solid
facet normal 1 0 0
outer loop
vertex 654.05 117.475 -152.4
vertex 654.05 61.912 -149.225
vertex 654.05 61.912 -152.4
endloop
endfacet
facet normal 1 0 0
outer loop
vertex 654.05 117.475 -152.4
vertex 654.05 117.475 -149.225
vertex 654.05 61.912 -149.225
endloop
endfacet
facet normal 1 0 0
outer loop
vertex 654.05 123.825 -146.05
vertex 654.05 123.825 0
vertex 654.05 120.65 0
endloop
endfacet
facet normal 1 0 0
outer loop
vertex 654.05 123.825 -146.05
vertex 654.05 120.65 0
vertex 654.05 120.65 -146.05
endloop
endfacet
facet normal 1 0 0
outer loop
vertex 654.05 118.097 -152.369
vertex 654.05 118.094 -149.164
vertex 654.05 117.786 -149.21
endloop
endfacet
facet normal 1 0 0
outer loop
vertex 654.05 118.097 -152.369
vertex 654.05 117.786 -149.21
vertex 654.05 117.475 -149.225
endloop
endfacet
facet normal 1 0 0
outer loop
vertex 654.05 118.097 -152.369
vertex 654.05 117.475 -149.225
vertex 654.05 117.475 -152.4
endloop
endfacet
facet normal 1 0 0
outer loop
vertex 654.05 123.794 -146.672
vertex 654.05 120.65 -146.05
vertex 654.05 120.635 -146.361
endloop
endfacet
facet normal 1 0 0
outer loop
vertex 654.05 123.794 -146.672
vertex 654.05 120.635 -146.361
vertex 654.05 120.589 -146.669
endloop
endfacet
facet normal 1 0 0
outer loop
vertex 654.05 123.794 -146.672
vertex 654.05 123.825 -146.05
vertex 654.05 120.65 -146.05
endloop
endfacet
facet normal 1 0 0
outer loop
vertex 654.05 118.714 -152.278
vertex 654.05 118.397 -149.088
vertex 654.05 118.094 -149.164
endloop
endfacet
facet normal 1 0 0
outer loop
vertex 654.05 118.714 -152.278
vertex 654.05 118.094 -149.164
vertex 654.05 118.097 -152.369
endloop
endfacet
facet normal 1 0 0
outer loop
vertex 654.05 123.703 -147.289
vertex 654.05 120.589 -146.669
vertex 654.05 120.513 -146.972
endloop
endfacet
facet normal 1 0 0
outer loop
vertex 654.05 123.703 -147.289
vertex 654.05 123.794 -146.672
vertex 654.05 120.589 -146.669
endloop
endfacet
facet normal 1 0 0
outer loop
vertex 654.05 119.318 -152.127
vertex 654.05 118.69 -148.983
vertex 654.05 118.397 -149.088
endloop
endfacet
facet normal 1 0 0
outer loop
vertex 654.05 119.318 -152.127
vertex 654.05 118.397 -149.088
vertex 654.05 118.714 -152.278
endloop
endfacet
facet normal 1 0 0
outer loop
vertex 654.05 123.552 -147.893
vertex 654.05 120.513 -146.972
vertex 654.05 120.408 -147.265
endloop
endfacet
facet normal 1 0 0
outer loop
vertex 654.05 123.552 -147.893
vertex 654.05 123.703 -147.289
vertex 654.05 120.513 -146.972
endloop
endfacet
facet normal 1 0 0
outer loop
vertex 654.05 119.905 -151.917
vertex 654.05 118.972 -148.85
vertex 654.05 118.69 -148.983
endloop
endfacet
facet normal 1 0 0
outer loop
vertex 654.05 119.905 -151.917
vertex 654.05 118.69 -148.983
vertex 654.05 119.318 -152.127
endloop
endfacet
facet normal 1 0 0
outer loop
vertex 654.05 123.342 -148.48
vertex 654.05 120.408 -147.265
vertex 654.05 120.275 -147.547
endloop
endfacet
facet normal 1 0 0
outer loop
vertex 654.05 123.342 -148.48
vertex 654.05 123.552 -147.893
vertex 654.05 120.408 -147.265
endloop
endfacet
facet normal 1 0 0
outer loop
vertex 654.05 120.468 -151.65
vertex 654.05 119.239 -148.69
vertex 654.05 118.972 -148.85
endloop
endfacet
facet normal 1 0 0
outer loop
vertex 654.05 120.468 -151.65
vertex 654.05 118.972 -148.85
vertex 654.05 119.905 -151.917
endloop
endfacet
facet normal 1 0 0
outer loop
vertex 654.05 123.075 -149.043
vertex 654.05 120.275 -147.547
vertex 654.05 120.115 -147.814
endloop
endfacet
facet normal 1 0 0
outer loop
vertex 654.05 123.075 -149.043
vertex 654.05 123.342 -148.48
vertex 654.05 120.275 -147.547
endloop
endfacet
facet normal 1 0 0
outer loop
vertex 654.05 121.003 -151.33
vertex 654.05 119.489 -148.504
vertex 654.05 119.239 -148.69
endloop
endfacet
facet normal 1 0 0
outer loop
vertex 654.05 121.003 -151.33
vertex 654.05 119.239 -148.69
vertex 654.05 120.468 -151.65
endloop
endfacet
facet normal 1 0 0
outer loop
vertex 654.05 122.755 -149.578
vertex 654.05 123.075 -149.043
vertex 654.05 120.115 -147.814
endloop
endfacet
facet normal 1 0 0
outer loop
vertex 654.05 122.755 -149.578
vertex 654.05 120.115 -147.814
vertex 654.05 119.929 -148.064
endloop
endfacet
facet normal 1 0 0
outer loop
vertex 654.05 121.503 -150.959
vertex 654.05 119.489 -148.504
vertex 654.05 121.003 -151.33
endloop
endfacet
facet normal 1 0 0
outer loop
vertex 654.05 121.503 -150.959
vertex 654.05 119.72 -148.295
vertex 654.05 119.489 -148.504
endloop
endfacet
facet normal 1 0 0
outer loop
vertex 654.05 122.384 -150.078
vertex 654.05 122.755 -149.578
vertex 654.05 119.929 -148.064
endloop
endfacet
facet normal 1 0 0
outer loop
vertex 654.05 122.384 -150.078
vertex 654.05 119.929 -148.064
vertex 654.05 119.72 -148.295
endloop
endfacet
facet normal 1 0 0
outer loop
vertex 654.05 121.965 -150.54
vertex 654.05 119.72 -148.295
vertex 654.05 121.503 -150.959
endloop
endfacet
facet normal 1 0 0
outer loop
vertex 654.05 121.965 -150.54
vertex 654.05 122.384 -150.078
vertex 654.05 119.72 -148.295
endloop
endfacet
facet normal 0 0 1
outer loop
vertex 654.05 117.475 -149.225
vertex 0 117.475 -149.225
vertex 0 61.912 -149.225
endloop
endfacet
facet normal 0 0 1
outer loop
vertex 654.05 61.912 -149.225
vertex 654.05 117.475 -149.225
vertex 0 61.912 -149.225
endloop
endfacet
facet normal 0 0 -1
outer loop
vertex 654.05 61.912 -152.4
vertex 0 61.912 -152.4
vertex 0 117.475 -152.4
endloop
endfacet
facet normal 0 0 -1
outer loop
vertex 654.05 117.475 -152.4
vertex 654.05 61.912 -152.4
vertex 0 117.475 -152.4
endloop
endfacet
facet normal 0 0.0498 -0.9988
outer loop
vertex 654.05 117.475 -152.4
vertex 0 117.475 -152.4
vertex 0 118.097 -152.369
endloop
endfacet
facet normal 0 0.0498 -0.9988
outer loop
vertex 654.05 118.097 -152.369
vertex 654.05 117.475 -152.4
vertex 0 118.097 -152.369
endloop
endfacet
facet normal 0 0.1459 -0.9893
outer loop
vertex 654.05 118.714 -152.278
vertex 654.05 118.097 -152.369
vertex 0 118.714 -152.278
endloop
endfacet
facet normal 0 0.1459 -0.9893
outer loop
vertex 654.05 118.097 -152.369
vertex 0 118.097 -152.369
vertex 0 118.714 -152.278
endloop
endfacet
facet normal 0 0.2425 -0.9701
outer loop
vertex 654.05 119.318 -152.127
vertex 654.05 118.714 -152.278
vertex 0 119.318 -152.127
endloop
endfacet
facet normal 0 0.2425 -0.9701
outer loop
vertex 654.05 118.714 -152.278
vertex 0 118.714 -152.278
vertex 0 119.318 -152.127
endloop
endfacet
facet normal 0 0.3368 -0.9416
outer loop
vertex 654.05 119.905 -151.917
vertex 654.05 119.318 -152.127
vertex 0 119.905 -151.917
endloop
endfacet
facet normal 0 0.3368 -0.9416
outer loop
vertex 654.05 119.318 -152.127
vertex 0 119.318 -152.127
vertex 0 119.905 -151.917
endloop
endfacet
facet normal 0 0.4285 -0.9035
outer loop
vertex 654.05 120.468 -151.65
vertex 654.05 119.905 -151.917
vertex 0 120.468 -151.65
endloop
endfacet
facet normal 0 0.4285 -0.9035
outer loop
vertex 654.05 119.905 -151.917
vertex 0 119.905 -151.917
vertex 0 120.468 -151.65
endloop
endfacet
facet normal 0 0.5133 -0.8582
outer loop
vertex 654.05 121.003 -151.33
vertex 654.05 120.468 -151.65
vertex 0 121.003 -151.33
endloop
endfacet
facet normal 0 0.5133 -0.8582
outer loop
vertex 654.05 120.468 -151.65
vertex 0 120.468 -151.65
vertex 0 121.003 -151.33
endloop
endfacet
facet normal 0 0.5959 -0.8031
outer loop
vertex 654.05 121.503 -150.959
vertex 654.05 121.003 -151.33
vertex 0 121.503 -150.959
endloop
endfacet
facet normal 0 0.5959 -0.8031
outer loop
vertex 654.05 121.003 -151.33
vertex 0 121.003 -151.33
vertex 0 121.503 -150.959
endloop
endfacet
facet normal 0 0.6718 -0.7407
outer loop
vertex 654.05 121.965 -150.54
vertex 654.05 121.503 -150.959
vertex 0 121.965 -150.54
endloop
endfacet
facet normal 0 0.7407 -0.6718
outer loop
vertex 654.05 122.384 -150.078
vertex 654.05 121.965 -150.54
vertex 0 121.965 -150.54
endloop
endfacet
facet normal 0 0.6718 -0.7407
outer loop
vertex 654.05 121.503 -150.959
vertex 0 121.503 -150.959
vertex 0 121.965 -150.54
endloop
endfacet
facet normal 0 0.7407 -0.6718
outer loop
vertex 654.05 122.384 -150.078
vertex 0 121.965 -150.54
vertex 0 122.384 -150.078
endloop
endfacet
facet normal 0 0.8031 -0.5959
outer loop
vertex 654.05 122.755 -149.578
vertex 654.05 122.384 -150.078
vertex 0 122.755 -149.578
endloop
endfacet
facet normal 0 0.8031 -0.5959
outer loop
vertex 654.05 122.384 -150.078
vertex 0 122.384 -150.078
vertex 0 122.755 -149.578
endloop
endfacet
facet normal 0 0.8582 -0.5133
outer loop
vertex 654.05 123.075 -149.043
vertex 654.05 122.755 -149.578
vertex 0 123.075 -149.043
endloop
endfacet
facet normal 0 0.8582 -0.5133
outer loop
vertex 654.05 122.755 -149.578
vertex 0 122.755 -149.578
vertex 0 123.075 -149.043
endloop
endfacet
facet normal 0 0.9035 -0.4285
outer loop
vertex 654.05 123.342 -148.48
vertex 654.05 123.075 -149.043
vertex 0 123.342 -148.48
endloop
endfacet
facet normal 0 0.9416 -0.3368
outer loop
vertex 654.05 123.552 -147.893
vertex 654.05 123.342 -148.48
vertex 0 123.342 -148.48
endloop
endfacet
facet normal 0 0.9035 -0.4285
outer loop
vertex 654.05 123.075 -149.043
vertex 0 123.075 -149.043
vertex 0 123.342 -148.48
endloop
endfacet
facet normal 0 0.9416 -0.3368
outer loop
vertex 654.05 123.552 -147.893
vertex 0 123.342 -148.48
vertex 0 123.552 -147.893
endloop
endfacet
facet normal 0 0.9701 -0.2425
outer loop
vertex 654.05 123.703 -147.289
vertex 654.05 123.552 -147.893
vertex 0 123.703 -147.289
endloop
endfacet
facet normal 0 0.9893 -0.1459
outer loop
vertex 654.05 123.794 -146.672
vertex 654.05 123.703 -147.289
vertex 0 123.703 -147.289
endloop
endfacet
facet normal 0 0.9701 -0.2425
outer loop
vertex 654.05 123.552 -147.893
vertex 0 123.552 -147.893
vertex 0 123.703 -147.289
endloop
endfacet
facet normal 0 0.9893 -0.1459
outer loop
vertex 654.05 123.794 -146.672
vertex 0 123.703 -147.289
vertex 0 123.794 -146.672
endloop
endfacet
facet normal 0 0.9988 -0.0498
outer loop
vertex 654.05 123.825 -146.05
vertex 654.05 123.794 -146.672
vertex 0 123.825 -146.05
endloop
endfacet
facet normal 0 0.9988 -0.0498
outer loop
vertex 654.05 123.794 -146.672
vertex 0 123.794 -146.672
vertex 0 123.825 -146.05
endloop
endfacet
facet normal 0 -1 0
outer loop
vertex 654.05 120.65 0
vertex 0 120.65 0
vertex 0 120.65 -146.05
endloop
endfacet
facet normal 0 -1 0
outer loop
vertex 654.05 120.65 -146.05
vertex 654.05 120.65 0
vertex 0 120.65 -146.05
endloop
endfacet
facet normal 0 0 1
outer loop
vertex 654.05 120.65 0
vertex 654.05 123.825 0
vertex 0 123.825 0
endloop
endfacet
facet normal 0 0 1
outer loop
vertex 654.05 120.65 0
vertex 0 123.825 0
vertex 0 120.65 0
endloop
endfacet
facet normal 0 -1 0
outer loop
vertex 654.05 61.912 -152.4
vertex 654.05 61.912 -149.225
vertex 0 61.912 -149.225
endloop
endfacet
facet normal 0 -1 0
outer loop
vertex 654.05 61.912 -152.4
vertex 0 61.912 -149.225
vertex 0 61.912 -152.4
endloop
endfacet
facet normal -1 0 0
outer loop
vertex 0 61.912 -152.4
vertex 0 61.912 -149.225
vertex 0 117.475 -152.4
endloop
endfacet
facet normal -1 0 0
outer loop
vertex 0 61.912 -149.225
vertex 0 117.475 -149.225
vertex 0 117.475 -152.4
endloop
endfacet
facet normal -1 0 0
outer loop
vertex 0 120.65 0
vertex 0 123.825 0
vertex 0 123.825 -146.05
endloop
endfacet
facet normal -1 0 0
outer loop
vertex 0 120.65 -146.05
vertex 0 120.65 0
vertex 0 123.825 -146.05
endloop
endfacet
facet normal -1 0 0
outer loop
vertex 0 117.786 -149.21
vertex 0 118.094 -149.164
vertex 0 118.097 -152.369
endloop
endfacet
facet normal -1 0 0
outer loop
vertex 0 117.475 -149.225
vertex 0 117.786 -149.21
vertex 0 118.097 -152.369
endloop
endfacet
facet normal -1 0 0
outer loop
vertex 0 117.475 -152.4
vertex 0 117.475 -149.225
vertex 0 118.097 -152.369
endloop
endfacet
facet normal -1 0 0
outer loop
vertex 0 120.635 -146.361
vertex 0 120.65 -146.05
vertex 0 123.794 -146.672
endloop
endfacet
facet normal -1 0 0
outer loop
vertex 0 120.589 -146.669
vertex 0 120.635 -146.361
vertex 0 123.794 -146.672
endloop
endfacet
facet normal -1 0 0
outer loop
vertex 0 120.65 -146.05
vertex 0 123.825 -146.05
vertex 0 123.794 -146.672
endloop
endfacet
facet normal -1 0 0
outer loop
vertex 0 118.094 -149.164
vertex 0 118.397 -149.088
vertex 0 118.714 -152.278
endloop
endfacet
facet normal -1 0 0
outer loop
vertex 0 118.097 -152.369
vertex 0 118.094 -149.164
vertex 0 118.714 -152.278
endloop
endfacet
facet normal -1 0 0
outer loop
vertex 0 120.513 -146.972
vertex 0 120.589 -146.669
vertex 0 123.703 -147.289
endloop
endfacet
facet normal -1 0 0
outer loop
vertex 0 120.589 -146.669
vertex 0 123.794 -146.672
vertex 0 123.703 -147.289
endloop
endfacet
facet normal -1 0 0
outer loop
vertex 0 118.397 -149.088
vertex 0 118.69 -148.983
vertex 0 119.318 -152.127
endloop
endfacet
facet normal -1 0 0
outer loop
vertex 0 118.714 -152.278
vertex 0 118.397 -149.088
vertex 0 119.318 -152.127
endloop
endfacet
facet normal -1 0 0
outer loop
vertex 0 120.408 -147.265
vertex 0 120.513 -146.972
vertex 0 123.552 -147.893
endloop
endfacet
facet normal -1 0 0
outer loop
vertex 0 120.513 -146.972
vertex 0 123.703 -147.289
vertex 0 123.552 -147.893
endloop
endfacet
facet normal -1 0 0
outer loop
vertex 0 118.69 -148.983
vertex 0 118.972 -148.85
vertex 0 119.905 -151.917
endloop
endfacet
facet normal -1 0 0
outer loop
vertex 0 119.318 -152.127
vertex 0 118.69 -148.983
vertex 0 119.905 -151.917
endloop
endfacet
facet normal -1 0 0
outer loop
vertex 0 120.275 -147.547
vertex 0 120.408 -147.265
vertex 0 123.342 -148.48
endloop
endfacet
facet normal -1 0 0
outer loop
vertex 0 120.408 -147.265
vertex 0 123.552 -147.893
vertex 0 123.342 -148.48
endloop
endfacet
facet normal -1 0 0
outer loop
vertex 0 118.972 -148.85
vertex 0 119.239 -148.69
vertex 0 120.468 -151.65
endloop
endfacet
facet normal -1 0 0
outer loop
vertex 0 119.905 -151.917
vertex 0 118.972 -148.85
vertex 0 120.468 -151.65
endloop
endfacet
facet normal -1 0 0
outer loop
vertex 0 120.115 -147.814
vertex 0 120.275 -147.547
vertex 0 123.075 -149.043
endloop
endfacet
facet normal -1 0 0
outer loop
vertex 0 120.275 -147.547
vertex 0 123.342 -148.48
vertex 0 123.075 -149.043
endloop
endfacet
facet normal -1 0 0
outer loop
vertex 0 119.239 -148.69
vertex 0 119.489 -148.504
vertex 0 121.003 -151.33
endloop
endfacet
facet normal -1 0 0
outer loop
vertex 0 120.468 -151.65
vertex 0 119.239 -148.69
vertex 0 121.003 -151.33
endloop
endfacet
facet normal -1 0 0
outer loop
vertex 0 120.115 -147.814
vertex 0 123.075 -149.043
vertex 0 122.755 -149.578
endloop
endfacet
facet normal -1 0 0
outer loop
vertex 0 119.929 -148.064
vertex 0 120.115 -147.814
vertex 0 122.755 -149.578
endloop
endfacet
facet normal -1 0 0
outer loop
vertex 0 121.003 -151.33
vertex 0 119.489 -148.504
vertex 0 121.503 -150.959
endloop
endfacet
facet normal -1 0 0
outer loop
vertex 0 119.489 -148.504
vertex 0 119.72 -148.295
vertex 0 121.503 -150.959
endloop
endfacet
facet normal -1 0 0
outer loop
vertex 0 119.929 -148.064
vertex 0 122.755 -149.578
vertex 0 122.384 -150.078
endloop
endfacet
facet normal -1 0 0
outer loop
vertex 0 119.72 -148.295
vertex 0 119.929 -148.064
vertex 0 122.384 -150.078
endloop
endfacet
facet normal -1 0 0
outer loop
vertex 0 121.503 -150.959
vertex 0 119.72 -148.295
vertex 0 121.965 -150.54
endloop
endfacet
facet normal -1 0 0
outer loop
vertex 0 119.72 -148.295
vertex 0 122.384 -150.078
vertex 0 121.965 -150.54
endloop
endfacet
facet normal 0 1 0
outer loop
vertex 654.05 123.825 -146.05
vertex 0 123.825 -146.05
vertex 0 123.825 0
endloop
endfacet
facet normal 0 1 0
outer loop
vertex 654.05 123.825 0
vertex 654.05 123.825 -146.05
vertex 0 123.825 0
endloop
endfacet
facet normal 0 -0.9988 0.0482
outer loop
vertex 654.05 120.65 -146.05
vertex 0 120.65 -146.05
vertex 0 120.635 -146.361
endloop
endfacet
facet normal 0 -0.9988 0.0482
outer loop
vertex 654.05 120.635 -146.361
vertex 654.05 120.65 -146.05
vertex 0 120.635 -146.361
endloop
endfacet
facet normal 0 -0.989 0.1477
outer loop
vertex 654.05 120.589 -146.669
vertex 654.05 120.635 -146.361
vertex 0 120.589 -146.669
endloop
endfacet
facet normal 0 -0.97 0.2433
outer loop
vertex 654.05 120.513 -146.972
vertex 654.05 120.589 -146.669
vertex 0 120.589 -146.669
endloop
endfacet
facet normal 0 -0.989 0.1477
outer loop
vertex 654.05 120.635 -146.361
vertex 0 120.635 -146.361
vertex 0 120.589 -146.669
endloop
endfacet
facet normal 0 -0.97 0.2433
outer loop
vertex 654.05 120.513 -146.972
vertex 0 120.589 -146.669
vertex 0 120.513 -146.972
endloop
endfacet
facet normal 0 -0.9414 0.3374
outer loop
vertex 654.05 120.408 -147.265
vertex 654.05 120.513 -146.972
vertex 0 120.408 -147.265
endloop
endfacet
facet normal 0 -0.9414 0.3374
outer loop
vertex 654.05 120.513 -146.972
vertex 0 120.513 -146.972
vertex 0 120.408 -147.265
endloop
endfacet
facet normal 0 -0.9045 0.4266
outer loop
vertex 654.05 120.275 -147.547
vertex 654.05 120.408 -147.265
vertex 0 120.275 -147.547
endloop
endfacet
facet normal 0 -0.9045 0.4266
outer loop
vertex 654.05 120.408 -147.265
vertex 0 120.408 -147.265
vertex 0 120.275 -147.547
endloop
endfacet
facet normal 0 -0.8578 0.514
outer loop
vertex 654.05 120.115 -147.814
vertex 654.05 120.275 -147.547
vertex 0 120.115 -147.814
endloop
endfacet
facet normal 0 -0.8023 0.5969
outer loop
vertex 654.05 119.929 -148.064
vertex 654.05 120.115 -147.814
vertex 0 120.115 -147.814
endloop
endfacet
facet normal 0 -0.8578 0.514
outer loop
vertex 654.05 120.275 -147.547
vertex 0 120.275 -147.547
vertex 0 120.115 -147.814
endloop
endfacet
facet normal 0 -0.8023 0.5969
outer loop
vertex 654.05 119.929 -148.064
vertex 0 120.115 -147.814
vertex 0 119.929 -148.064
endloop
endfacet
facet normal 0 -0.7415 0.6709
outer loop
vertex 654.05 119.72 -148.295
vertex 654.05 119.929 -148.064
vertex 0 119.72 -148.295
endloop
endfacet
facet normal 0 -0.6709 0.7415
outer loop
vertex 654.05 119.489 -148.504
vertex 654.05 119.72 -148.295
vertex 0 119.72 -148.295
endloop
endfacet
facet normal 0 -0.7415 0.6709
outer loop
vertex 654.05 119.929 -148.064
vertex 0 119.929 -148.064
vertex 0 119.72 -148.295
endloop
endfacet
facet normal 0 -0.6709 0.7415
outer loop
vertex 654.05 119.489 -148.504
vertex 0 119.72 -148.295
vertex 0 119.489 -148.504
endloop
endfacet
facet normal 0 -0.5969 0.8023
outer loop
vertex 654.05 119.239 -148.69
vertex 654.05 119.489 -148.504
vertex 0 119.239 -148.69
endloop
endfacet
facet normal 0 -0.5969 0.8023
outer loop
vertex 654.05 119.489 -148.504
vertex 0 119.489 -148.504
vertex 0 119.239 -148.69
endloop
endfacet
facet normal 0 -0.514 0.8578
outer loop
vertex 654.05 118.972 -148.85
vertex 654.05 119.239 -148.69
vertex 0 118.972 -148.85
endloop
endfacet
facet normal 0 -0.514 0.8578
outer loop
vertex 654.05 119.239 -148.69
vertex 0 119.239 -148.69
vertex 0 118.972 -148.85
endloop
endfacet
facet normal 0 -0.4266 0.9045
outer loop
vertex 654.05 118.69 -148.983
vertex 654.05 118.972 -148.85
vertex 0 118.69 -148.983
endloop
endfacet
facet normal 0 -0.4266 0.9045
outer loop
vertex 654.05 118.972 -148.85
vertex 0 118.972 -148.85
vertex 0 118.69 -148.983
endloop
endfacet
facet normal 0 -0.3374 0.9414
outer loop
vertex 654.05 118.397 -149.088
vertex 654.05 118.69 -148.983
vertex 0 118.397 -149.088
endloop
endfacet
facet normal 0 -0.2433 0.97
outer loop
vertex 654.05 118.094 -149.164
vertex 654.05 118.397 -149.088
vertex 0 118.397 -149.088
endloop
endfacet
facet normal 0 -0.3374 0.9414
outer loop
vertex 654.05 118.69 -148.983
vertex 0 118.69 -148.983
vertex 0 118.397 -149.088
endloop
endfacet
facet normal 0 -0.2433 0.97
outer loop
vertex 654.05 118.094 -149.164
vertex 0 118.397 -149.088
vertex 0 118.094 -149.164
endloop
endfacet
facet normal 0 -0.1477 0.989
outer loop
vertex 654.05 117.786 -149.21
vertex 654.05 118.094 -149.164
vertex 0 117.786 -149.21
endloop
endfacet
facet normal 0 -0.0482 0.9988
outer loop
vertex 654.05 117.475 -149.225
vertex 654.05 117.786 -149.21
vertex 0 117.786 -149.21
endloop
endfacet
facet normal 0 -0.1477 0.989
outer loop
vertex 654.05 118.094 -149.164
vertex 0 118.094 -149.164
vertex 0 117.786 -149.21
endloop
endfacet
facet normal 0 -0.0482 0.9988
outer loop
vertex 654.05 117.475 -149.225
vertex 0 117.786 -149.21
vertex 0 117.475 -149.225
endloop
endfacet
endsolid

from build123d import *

# Parameters (mm, degrees)
BASE_FLANGE1_DEPTH = 654.05
SKETCH10_W         = 152.4
SKETCH10_H         = 61.9125
CUT_EXTRUDE5_DEPTH = 683.89076222


# Sheet-metal steps are written as plain solids
with BuildPart() as part:
    # Sketch1 → Base-Flange1 (new body)
    with BuildSketch(Plane(origin=(0, 0, 0), x_dir=(0, 0, -1), z_dir=(1, 0, 0))):
        with BuildLine():
            Line((0, 0), (146.05, 0))
            ThreePointArc((146.05, 0), (150.540128061, 1.859871939), (152.4, 6.35))
            Line((152.4, 6.35), (152.4, 117.475))
            ThreePointArc((152.4, 117.475), (150.540128061, 121.965128061), (146.05, 123.825))
            Line((146.05, 123.825), (0, 123.825))
            Line((0, 123.825), (0, 120.65))
            Line((0, 120.65), (146.05, 120.65))
            ThreePointArc((146.05, 120.65), (148.29506403, 119.72006403), (149.225, 117.475))
            Line((149.225, 117.475), (149.225, 6.35))
            ThreePointArc((149.225, 6.35), (148.29506403, 4.10493597), (146.05, 3.175))
            Line((146.05, 3.175), (0, 3.175))
            Line((0, 3.175), (0, 0))
        make_face()
    extrude(amount=BASE_FLANGE1_DEPTH)

    # Sketch10 → Cut-Extrude5 (cut, through all)
    with BuildSketch(Plane(origin=(654.05, 0, 0), x_dir=(0, 0, -1), z_dir=(1, 0, 0))):
        with Locations((76.2, 30.95625)):
            Rectangle(SKETCH10_W, SKETCH10_H)
    extrude(amount=-CUT_EXTRUDE5_DEPTH, mode=Mode.SUBTRACT)


solid = part.part
